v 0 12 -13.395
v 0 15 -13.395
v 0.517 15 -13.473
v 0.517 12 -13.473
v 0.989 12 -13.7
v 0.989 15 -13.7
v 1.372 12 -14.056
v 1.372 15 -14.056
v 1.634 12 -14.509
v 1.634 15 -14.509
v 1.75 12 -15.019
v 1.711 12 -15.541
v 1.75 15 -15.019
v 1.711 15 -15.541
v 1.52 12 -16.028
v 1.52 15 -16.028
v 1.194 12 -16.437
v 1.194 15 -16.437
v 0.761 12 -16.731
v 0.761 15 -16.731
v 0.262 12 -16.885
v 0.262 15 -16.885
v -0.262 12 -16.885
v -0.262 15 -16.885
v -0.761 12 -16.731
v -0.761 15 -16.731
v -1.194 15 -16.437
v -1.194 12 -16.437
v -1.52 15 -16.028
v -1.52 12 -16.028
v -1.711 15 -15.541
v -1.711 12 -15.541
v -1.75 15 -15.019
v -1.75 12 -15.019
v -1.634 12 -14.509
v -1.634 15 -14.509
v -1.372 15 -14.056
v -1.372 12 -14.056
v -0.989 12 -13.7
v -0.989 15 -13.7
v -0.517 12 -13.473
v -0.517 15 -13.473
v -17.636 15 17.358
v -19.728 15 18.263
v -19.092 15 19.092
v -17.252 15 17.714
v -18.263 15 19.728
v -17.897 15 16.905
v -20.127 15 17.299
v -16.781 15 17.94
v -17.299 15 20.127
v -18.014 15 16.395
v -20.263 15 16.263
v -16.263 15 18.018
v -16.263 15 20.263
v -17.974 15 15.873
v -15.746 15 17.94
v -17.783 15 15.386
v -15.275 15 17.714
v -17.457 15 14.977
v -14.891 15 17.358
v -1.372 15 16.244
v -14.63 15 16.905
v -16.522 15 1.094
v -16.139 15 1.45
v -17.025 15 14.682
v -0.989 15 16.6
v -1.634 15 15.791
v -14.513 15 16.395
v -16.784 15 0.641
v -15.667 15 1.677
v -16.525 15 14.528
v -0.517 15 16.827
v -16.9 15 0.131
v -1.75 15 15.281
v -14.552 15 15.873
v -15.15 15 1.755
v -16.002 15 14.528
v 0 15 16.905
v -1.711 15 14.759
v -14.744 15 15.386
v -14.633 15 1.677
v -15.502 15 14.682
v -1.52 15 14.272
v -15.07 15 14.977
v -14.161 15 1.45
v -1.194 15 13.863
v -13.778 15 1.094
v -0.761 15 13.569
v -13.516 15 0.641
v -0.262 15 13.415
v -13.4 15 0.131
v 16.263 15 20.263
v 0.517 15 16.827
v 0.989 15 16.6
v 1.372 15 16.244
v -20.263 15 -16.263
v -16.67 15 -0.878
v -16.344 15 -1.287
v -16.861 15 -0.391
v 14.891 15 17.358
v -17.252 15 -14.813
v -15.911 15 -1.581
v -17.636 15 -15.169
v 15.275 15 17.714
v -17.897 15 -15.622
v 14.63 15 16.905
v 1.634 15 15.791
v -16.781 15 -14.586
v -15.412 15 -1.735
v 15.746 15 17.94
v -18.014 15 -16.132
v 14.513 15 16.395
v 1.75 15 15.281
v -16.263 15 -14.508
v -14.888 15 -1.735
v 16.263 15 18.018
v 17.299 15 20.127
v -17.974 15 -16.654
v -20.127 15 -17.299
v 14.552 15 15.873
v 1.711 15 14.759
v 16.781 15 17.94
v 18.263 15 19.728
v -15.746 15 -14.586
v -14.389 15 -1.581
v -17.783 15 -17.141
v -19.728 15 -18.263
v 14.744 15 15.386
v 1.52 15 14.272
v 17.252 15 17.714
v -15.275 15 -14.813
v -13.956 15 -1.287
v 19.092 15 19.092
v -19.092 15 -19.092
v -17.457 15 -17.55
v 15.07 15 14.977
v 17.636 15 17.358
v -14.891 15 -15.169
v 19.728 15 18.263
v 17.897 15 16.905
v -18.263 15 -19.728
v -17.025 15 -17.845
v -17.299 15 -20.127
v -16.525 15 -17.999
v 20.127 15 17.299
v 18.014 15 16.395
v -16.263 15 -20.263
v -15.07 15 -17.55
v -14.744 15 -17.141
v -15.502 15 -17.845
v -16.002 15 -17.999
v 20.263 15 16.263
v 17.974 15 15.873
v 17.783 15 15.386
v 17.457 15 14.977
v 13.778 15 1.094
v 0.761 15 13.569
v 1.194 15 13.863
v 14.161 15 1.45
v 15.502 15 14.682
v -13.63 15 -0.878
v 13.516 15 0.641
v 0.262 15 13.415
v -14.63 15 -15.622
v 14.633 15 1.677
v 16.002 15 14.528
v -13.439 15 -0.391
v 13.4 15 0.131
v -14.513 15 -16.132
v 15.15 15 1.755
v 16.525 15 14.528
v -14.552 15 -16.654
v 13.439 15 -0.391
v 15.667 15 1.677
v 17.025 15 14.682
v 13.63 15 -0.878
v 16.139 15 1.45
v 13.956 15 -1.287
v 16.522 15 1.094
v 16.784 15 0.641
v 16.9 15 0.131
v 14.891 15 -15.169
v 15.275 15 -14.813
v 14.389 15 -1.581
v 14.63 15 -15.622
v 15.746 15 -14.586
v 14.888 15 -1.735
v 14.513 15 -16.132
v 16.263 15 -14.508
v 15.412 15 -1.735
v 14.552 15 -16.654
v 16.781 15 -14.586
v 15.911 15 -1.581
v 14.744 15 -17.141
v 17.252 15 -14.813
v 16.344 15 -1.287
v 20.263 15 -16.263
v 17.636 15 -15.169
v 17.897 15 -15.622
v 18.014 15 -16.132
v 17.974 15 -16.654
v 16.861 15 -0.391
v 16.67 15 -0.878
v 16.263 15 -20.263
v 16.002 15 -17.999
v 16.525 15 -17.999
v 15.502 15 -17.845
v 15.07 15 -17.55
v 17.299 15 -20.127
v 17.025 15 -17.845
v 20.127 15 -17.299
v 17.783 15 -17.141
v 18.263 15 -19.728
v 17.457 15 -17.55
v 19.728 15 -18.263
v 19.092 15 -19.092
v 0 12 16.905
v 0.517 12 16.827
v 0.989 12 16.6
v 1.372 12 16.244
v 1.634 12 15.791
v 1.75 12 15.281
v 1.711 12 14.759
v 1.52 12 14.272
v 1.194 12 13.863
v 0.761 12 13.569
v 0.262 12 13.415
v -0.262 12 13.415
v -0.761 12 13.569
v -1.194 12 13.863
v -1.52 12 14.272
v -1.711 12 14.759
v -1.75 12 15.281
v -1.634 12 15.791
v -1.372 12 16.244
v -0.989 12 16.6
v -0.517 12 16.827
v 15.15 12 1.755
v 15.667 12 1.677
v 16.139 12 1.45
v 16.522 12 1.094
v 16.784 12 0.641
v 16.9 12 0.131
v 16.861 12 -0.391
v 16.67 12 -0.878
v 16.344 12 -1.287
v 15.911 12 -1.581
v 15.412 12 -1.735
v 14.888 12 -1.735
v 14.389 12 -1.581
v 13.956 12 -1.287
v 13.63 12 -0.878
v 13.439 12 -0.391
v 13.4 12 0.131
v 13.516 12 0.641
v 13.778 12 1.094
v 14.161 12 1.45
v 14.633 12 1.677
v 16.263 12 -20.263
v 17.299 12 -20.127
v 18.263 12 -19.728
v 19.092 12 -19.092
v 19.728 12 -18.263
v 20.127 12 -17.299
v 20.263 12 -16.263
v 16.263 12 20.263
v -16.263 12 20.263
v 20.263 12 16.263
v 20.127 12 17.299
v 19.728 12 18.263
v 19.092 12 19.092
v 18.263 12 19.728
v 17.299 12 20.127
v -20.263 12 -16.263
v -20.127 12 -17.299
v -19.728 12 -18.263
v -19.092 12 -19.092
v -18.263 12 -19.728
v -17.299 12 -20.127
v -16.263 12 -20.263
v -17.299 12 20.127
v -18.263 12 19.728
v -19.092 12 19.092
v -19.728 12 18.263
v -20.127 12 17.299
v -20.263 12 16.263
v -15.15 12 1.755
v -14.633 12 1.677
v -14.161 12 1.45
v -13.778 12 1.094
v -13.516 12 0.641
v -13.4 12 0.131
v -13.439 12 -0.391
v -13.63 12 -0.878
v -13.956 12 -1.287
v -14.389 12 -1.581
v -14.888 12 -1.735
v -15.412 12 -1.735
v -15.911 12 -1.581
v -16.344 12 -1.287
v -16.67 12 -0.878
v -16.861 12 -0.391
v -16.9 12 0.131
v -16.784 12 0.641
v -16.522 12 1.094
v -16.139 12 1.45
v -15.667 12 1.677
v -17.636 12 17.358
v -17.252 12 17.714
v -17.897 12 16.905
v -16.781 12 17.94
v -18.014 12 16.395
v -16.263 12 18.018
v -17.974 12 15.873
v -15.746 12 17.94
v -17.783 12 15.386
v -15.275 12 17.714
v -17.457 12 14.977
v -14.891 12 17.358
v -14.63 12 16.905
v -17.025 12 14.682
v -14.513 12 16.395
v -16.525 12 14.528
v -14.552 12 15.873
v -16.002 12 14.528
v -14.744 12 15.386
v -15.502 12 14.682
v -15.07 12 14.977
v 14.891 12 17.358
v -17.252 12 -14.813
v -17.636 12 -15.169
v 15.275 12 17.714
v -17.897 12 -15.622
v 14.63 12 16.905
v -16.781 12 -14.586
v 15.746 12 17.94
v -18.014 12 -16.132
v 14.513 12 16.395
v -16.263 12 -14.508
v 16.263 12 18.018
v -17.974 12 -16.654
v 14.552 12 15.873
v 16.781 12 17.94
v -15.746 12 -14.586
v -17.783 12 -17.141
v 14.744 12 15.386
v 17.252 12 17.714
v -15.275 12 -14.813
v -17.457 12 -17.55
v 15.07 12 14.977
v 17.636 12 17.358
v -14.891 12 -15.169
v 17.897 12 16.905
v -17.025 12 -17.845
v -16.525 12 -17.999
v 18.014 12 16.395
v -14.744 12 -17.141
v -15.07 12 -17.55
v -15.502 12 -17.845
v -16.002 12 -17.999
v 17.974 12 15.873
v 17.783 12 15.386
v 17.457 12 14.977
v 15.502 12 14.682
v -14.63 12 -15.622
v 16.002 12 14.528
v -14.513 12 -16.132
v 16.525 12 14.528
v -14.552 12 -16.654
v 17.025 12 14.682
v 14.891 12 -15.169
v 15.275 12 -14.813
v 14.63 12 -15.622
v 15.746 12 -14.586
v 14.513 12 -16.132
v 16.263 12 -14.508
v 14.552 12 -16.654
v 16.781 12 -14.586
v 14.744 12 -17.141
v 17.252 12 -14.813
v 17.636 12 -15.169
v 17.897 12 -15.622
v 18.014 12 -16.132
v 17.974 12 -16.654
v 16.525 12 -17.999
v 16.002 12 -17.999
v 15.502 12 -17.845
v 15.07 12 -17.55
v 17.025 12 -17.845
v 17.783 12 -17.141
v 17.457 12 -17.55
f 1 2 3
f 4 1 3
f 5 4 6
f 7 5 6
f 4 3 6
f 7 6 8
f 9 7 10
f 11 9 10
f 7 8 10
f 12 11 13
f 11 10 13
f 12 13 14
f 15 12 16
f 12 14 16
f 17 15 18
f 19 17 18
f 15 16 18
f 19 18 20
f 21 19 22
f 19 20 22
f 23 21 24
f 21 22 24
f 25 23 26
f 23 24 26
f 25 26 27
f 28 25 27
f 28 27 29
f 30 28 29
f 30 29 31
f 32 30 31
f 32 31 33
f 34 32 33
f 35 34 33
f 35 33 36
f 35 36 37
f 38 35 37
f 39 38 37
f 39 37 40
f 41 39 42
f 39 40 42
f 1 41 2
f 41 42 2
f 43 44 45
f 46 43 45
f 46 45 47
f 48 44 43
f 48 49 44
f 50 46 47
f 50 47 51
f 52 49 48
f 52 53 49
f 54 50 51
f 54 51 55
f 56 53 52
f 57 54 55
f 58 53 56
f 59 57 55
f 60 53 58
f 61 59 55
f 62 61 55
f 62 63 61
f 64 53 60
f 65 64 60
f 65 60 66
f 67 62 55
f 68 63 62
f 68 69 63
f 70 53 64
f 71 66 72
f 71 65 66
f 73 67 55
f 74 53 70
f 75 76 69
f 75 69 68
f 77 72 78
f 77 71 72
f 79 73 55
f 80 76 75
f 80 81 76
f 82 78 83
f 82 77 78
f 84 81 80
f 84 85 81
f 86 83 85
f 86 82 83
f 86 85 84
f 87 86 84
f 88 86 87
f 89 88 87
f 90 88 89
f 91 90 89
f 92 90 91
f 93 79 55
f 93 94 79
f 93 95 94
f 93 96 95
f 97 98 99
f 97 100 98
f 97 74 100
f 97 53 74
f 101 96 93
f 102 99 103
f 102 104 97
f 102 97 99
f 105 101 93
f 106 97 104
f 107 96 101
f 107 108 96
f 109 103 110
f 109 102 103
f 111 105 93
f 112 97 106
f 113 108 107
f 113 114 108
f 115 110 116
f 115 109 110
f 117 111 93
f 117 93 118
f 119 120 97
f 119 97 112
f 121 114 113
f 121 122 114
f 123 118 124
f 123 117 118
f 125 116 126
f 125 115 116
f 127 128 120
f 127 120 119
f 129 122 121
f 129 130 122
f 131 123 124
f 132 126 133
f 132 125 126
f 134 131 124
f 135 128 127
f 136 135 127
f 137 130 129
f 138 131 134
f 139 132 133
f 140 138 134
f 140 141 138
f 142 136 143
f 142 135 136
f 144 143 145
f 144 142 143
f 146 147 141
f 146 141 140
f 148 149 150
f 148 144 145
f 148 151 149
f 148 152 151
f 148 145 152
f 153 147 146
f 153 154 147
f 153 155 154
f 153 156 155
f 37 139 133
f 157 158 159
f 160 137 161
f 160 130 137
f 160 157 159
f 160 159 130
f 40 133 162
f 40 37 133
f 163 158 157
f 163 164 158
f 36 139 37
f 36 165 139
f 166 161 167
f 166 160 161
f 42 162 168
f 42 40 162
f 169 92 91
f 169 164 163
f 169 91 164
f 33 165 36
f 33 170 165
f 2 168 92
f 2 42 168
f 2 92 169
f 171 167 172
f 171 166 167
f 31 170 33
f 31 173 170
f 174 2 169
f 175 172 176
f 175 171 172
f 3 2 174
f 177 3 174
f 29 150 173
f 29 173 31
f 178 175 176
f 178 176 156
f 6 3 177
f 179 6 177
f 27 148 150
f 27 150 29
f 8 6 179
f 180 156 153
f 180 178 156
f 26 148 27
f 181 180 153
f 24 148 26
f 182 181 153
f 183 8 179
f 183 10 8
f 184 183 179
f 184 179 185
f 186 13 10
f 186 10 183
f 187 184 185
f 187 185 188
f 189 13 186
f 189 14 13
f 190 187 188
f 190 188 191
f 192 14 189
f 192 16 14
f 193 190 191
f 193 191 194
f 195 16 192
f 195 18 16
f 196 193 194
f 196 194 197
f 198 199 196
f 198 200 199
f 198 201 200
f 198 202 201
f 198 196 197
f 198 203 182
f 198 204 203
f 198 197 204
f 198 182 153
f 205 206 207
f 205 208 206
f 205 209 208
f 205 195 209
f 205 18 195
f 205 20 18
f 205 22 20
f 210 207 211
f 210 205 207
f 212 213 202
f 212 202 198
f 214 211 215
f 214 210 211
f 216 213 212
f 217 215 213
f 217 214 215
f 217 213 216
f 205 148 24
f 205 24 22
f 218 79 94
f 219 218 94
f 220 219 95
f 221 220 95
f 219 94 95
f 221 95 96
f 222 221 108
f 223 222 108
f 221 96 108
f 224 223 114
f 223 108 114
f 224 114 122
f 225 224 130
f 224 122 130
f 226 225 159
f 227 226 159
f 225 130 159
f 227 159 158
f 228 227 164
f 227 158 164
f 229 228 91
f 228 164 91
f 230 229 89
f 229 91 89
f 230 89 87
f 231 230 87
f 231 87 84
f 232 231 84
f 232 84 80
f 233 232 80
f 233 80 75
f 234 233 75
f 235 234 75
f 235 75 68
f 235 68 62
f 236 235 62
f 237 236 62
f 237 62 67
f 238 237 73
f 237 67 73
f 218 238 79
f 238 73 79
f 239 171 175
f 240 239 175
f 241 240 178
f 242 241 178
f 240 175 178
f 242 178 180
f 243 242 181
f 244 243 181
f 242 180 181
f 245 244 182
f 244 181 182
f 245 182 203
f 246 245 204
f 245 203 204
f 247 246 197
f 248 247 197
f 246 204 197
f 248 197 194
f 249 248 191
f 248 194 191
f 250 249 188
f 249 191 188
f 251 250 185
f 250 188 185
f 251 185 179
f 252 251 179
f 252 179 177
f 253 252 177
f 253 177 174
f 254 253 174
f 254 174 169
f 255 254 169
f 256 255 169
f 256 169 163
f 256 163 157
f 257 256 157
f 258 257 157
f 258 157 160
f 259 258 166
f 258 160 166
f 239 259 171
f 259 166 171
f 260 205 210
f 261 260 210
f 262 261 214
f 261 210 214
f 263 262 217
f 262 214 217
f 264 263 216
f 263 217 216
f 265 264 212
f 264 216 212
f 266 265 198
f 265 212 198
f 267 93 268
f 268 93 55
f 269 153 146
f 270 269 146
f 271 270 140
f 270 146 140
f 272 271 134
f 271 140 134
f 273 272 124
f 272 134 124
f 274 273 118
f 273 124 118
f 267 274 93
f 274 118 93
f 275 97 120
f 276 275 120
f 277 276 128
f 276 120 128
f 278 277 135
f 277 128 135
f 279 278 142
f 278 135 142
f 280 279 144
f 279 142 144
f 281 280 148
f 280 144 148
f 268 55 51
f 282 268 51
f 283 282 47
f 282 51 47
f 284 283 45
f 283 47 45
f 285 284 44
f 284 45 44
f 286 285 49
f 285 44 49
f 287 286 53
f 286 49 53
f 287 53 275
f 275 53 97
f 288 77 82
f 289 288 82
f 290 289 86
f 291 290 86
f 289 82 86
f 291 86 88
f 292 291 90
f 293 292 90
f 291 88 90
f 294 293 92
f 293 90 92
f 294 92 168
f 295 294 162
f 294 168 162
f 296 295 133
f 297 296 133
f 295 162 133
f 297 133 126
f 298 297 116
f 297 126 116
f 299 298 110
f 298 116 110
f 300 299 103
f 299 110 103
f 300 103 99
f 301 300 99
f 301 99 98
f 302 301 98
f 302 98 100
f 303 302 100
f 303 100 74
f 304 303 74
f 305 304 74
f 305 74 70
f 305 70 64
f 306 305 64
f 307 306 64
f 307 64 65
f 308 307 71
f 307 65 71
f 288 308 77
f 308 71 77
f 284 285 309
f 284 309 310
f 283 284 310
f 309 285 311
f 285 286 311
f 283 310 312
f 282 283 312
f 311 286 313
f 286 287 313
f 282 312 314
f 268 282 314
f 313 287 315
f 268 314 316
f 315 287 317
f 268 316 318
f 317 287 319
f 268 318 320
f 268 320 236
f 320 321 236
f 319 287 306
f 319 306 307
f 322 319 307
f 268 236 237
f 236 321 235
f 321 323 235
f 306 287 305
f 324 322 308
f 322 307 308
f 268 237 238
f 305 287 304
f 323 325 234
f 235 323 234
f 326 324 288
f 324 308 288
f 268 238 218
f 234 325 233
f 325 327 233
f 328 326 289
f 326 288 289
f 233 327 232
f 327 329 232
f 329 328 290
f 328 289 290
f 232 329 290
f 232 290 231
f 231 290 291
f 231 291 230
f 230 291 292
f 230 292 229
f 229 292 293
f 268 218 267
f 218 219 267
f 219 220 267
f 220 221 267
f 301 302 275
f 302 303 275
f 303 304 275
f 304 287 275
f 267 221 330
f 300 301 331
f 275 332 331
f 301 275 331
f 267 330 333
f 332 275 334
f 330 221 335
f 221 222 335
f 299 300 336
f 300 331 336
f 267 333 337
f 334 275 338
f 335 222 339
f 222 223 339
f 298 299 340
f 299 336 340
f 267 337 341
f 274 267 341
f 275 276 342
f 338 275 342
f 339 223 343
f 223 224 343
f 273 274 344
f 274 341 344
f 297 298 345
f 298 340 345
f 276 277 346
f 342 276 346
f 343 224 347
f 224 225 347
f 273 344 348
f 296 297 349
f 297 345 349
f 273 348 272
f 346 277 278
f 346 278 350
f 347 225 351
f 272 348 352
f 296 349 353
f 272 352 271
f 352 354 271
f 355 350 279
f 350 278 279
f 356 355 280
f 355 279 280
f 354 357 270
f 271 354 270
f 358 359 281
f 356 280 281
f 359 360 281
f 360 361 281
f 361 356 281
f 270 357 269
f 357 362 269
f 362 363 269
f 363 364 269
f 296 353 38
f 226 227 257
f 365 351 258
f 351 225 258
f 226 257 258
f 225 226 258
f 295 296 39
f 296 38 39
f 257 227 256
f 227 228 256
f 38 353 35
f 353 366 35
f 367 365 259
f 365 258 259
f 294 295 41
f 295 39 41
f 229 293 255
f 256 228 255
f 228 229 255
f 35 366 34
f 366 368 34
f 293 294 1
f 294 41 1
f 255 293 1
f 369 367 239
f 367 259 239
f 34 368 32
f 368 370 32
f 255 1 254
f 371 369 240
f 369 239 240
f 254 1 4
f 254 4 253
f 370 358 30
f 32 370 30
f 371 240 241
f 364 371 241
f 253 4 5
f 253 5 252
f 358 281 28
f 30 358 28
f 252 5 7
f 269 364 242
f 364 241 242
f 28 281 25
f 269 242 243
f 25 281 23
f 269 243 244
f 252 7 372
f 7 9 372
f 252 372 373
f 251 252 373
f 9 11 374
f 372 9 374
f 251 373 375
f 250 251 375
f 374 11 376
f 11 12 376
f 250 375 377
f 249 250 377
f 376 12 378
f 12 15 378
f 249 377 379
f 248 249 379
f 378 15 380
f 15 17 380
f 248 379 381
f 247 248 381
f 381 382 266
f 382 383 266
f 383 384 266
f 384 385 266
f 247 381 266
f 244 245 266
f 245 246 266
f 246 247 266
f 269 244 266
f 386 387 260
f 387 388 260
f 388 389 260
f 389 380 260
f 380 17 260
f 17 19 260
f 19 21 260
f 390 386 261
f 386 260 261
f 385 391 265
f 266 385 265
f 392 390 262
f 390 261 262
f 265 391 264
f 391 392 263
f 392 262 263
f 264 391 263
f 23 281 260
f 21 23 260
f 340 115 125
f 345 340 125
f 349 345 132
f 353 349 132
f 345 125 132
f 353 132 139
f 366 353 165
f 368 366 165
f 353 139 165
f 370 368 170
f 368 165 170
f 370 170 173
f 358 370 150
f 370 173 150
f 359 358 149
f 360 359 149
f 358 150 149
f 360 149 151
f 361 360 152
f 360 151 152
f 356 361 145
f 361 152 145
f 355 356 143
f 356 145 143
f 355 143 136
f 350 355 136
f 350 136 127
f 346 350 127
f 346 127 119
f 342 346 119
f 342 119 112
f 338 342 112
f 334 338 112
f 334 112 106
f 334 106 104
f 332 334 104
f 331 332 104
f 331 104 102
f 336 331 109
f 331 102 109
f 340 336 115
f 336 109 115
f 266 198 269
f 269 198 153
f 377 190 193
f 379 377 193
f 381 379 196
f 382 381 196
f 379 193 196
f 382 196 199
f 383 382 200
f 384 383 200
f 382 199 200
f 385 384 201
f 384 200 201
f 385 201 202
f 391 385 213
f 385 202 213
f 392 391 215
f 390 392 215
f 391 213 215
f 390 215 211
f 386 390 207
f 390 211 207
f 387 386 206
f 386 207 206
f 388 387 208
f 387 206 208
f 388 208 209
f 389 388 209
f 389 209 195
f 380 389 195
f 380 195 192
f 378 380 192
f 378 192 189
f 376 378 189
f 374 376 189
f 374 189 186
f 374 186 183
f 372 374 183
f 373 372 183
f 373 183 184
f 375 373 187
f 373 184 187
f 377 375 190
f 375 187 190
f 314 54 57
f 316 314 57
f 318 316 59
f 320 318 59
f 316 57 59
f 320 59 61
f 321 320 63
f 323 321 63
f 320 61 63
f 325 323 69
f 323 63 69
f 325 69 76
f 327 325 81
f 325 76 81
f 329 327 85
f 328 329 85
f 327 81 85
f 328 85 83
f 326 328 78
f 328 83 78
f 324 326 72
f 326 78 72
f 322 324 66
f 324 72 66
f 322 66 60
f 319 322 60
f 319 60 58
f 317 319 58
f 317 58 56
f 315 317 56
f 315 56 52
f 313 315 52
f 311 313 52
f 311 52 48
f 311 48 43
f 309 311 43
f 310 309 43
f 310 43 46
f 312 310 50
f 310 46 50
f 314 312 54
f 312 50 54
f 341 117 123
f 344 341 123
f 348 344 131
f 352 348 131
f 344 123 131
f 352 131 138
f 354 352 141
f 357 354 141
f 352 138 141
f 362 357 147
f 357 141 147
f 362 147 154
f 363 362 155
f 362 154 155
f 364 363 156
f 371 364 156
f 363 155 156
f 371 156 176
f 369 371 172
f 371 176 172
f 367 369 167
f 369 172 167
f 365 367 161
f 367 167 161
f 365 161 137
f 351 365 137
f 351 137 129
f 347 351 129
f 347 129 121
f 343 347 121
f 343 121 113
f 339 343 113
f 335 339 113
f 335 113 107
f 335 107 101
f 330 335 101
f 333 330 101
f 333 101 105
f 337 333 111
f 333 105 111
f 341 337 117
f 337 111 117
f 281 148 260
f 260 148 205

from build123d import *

# Parameters (mm, degrees)
SKETCH1_R               = 11.9
SKETCH1_R_2             = 9.9
BOSS_EXTRUDE3_DEPTH     = 15
SKETCH4_R               = 9.9
BOSS_EXTRUDE4_DEPTH     = 5.1
BOSS_EXTRUDE8_START     = -3
SKETCH12_R              = 19
SKETCH12_R_2            = 11.9
BOSS_EXTRUDE8_DEPTH     = 3
SKETCH14_R              = 1.755
CUT_EXTRUDE4_DEPTH      = 3
CUT_EXTRUDE5_DEPTH      = 25
CUT_EXTRUDE5_DEPTH_BACK = 20
SKETCH15_W              = 38
SKETCH15_H              = 16.079993569
BOSS_EXTRUDE9_START     = -3
SKETCH16_R              = 9.9
BOSS_EXTRUDE9_DEPTH     = 3
BOSS_EXTRUDE10_START    = -3
SKETCH17_W              = 40
SKETCH17_H              = 40
SKETCH17_R              = 19
BOSS_EXTRUDE10_DEPTH    = 3
SKETCH20_W              = 60
SKETCH20_H              = 60
SKETCH20_W_2            = 40
SKETCH20_H_2            = 40
BOSS_EXTRUDE11_DEPTH    = 3
SKETCH21_R              = 1.755
CUT_EXTRUDE7_DEPTH      = 3
SKETCH23_W              = 60
SKETCH23_H              = 60
CUT_EXTRUDE9_DEPTH      = 3


with BuildPart() as part:
    # Sketch1 → Boss-Extrude3 (new body)
    with BuildSketch(Plane(origin=(0, 0, 0), x_dir=(1, 0, 0), z_dir=(0, 1, 0))):
        with Locations(Location((0, 0, 0), (0, 0, 270))):
            Circle(SKETCH1_R)
        with Locations(Location((0, 0, 0), (0, 0, 270))):
            Circle(SKETCH1_R_2, mode=Mode.SUBTRACT)
    extrude(amount=BOSS_EXTRUDE3_DEPTH)

    # Sketch4 → Boss-Extrude4 (add)
    with BuildSketch(Plane.XZ):
        with Locations(Location((0, 0, 0), (0, 0, 270))):
            Circle(SKETCH4_R)
    extrude(amount=-BOSS_EXTRUDE4_DEPTH)

    # Sketch7 → Cut-Revolve2 (revolve, cut)
    with BuildSketch(Plane(origin=(0, 0, 0), x_dir=(0, 0, -1), z_dir=(1, 0, 0))):
        with BuildLine():
            Line((0, 15), (0, -4.8))
            ThreePointArc((0, -4.8), (9.9, 5.1), (0, 15))
        make_face()
    revolve(axis=Axis((0, 15, 0), (0, -1, 0)), mode=Mode.SUBTRACT)

    # Sketch12 → Boss-Extrude8 (add)
    with BuildSketch(Plane(origin=(0, 15, 0), x_dir=(1, 0, 0), z_dir=(0, 1, 0)).offset(BOSS_EXTRUDE8_START)):
        with Locations(Location((0, 0, 0), (0, 0, 270))):
            Circle(SKETCH12_R)
        with Locations(Location((0, 0, 0), (0, 0, 270))):
            Circle(SKETCH12_R_2, mode=Mode.SUBTRACT)
    extrude(amount=BOSS_EXTRUDE8_DEPTH)

    # Sketch14 → Cut-Extrude4 (cut)
    with BuildSketch(Plane(origin=(0, 15, 0), x_dir=(1, 0, 0), z_dir=(0, 1, 0))):
        with Locations(Location((0, 15.15, 0), (0, 0, 270))):
            Circle(SKETCH14_R)
        with Locations(Location((-15.15, 0, 0), (0, 0, 270))):
            Circle(SKETCH14_R)
        with Locations(Location((0, -15.15, 0), (0, 0, 270))):
            Circle(SKETCH14_R)
        with Locations(Location((15.15, 0, 0), (0, 0, 270))):
            Circle(SKETCH14_R)
    extrude(amount=-CUT_EXTRUDE4_DEPTH, mode=Mode.SUBTRACT)

    # Sketch15 → Cut-Extrude5 (cut, two sides: drawn at the far end of the back side and taken through both)
    with BuildSketch(Plane(origin=(0, 0, 0), x_dir=(0, 0, -1), z_dir=(1, 0, 0)).offset(-CUT_EXTRUDE5_DEPTH_BACK)):
        with Locations((0, 3.960003216)):
            Rectangle(SKETCH15_W, SKETCH15_H)
    extrude(amount=CUT_EXTRUDE5_DEPTH + CUT_EXTRUDE5_DEPTH_BACK, mode=Mode.SUBTRACT)

    # Sketch16 → Boss-Extrude9 (add)
    with BuildSketch(Plane(origin=(0, 15, 0), x_dir=(1, 0, 0), z_dir=(0, 1, 0)).offset(BOSS_EXTRUDE9_START)):
        Circle(SKETCH16_R)
    extrude(amount=BOSS_EXTRUDE9_DEPTH)

    # Sketch17 → Boss-Extrude10 (add)
    with BuildSketch(Plane(origin=(0, 15, 0), x_dir=(1, 0, 0), z_dir=(0, 1, 0)).offset(BOSS_EXTRUDE10_START)):
        Rectangle(SKETCH17_W, SKETCH17_H)
        Circle(SKETCH17_R, mode=Mode.SUBTRACT)
    extrude(amount=BOSS_EXTRUDE10_DEPTH)

    # Sketch20 → Boss-Extrude11 (add)
    with BuildSketch(Plane(origin=(0, 15, 0), x_dir=(1, 0, 0), z_dir=(0, 1, 0))):
        Rectangle(SKETCH20_W, SKETCH20_H)
        Rectangle(SKETCH20_W_2, SKETCH20_H_2, mode=Mode.SUBTRACT)
    extrude(amount=-BOSS_EXTRUDE11_DEPTH)

    # Sketch21 → Cut-Extrude7 (cut)
    with BuildSketch(Plane(origin=(0, 15, 0), x_dir=(1, 0, 0), z_dir=(0, 1, 0))):
        with Locations(Location((-16.263455967, 16.263455967, 0), (0, 0, 270))):
            Circle(SKETCH21_R)
        with Locations(Location((-16.263455967, -16.263455967, 0), (0, 0, 270))):
            Circle(SKETCH21_R)
        with Locations(Location((16.263455967, 16.263455967, 0), (0, 0, 270))):
            Circle(SKETCH21_R)
        with Locations(Location((16.263455967, -16.263455967, 0), (0, 0, 270))):
            Circle(SKETCH21_R)
    extrude(amount=-CUT_EXTRUDE7_DEPTH, mode=Mode.SUBTRACT)

    # Sketch23 → Cut-Extrude9 (cut)
    with BuildSketch(Plane(origin=(0, 15, 0), x_dir=(1, 0, 0), z_dir=(0, 1, 0))):
        Rectangle(SKETCH23_W, SKETCH23_H)
        with BuildLine():
            Line((-20.263455967, -16.263455967), (-20.263455967, 16.263455967))
            ThreePointArc((-20.263455967, 16.263455967), (-19.091883092, 19.091883092), (-16.263455967, 20.263455967))
            Line((-16.263455967, 20.263455967), (16.263455967, 20.263455967))
            ThreePointArc((16.263455967, 20.263455967), (19.091883092, 19.091883092), (20.263455967, 16.263455967))
            Line((20.263455967, 16.263455967), (20.263455967, -16.263455967))
            ThreePointArc((20.263455967, -16.263455967), (19.091883092, -19.091883092), (16.263455967, -20.263455967))
            Line((16.263455967, -20.263455967), (-16.263455967, -20.263455967))
            ThreePointArc((-16.263455967, -20.263455967), (-19.091883092, -19.091883092), (-20.263455967, -16.263455967))
        make_face(mode=Mode.SUBTRACT)
    extrude(amount=-CUT_EXTRUDE9_DEPTH, mode=Mode.SUBTRACT)


solid = part.part
